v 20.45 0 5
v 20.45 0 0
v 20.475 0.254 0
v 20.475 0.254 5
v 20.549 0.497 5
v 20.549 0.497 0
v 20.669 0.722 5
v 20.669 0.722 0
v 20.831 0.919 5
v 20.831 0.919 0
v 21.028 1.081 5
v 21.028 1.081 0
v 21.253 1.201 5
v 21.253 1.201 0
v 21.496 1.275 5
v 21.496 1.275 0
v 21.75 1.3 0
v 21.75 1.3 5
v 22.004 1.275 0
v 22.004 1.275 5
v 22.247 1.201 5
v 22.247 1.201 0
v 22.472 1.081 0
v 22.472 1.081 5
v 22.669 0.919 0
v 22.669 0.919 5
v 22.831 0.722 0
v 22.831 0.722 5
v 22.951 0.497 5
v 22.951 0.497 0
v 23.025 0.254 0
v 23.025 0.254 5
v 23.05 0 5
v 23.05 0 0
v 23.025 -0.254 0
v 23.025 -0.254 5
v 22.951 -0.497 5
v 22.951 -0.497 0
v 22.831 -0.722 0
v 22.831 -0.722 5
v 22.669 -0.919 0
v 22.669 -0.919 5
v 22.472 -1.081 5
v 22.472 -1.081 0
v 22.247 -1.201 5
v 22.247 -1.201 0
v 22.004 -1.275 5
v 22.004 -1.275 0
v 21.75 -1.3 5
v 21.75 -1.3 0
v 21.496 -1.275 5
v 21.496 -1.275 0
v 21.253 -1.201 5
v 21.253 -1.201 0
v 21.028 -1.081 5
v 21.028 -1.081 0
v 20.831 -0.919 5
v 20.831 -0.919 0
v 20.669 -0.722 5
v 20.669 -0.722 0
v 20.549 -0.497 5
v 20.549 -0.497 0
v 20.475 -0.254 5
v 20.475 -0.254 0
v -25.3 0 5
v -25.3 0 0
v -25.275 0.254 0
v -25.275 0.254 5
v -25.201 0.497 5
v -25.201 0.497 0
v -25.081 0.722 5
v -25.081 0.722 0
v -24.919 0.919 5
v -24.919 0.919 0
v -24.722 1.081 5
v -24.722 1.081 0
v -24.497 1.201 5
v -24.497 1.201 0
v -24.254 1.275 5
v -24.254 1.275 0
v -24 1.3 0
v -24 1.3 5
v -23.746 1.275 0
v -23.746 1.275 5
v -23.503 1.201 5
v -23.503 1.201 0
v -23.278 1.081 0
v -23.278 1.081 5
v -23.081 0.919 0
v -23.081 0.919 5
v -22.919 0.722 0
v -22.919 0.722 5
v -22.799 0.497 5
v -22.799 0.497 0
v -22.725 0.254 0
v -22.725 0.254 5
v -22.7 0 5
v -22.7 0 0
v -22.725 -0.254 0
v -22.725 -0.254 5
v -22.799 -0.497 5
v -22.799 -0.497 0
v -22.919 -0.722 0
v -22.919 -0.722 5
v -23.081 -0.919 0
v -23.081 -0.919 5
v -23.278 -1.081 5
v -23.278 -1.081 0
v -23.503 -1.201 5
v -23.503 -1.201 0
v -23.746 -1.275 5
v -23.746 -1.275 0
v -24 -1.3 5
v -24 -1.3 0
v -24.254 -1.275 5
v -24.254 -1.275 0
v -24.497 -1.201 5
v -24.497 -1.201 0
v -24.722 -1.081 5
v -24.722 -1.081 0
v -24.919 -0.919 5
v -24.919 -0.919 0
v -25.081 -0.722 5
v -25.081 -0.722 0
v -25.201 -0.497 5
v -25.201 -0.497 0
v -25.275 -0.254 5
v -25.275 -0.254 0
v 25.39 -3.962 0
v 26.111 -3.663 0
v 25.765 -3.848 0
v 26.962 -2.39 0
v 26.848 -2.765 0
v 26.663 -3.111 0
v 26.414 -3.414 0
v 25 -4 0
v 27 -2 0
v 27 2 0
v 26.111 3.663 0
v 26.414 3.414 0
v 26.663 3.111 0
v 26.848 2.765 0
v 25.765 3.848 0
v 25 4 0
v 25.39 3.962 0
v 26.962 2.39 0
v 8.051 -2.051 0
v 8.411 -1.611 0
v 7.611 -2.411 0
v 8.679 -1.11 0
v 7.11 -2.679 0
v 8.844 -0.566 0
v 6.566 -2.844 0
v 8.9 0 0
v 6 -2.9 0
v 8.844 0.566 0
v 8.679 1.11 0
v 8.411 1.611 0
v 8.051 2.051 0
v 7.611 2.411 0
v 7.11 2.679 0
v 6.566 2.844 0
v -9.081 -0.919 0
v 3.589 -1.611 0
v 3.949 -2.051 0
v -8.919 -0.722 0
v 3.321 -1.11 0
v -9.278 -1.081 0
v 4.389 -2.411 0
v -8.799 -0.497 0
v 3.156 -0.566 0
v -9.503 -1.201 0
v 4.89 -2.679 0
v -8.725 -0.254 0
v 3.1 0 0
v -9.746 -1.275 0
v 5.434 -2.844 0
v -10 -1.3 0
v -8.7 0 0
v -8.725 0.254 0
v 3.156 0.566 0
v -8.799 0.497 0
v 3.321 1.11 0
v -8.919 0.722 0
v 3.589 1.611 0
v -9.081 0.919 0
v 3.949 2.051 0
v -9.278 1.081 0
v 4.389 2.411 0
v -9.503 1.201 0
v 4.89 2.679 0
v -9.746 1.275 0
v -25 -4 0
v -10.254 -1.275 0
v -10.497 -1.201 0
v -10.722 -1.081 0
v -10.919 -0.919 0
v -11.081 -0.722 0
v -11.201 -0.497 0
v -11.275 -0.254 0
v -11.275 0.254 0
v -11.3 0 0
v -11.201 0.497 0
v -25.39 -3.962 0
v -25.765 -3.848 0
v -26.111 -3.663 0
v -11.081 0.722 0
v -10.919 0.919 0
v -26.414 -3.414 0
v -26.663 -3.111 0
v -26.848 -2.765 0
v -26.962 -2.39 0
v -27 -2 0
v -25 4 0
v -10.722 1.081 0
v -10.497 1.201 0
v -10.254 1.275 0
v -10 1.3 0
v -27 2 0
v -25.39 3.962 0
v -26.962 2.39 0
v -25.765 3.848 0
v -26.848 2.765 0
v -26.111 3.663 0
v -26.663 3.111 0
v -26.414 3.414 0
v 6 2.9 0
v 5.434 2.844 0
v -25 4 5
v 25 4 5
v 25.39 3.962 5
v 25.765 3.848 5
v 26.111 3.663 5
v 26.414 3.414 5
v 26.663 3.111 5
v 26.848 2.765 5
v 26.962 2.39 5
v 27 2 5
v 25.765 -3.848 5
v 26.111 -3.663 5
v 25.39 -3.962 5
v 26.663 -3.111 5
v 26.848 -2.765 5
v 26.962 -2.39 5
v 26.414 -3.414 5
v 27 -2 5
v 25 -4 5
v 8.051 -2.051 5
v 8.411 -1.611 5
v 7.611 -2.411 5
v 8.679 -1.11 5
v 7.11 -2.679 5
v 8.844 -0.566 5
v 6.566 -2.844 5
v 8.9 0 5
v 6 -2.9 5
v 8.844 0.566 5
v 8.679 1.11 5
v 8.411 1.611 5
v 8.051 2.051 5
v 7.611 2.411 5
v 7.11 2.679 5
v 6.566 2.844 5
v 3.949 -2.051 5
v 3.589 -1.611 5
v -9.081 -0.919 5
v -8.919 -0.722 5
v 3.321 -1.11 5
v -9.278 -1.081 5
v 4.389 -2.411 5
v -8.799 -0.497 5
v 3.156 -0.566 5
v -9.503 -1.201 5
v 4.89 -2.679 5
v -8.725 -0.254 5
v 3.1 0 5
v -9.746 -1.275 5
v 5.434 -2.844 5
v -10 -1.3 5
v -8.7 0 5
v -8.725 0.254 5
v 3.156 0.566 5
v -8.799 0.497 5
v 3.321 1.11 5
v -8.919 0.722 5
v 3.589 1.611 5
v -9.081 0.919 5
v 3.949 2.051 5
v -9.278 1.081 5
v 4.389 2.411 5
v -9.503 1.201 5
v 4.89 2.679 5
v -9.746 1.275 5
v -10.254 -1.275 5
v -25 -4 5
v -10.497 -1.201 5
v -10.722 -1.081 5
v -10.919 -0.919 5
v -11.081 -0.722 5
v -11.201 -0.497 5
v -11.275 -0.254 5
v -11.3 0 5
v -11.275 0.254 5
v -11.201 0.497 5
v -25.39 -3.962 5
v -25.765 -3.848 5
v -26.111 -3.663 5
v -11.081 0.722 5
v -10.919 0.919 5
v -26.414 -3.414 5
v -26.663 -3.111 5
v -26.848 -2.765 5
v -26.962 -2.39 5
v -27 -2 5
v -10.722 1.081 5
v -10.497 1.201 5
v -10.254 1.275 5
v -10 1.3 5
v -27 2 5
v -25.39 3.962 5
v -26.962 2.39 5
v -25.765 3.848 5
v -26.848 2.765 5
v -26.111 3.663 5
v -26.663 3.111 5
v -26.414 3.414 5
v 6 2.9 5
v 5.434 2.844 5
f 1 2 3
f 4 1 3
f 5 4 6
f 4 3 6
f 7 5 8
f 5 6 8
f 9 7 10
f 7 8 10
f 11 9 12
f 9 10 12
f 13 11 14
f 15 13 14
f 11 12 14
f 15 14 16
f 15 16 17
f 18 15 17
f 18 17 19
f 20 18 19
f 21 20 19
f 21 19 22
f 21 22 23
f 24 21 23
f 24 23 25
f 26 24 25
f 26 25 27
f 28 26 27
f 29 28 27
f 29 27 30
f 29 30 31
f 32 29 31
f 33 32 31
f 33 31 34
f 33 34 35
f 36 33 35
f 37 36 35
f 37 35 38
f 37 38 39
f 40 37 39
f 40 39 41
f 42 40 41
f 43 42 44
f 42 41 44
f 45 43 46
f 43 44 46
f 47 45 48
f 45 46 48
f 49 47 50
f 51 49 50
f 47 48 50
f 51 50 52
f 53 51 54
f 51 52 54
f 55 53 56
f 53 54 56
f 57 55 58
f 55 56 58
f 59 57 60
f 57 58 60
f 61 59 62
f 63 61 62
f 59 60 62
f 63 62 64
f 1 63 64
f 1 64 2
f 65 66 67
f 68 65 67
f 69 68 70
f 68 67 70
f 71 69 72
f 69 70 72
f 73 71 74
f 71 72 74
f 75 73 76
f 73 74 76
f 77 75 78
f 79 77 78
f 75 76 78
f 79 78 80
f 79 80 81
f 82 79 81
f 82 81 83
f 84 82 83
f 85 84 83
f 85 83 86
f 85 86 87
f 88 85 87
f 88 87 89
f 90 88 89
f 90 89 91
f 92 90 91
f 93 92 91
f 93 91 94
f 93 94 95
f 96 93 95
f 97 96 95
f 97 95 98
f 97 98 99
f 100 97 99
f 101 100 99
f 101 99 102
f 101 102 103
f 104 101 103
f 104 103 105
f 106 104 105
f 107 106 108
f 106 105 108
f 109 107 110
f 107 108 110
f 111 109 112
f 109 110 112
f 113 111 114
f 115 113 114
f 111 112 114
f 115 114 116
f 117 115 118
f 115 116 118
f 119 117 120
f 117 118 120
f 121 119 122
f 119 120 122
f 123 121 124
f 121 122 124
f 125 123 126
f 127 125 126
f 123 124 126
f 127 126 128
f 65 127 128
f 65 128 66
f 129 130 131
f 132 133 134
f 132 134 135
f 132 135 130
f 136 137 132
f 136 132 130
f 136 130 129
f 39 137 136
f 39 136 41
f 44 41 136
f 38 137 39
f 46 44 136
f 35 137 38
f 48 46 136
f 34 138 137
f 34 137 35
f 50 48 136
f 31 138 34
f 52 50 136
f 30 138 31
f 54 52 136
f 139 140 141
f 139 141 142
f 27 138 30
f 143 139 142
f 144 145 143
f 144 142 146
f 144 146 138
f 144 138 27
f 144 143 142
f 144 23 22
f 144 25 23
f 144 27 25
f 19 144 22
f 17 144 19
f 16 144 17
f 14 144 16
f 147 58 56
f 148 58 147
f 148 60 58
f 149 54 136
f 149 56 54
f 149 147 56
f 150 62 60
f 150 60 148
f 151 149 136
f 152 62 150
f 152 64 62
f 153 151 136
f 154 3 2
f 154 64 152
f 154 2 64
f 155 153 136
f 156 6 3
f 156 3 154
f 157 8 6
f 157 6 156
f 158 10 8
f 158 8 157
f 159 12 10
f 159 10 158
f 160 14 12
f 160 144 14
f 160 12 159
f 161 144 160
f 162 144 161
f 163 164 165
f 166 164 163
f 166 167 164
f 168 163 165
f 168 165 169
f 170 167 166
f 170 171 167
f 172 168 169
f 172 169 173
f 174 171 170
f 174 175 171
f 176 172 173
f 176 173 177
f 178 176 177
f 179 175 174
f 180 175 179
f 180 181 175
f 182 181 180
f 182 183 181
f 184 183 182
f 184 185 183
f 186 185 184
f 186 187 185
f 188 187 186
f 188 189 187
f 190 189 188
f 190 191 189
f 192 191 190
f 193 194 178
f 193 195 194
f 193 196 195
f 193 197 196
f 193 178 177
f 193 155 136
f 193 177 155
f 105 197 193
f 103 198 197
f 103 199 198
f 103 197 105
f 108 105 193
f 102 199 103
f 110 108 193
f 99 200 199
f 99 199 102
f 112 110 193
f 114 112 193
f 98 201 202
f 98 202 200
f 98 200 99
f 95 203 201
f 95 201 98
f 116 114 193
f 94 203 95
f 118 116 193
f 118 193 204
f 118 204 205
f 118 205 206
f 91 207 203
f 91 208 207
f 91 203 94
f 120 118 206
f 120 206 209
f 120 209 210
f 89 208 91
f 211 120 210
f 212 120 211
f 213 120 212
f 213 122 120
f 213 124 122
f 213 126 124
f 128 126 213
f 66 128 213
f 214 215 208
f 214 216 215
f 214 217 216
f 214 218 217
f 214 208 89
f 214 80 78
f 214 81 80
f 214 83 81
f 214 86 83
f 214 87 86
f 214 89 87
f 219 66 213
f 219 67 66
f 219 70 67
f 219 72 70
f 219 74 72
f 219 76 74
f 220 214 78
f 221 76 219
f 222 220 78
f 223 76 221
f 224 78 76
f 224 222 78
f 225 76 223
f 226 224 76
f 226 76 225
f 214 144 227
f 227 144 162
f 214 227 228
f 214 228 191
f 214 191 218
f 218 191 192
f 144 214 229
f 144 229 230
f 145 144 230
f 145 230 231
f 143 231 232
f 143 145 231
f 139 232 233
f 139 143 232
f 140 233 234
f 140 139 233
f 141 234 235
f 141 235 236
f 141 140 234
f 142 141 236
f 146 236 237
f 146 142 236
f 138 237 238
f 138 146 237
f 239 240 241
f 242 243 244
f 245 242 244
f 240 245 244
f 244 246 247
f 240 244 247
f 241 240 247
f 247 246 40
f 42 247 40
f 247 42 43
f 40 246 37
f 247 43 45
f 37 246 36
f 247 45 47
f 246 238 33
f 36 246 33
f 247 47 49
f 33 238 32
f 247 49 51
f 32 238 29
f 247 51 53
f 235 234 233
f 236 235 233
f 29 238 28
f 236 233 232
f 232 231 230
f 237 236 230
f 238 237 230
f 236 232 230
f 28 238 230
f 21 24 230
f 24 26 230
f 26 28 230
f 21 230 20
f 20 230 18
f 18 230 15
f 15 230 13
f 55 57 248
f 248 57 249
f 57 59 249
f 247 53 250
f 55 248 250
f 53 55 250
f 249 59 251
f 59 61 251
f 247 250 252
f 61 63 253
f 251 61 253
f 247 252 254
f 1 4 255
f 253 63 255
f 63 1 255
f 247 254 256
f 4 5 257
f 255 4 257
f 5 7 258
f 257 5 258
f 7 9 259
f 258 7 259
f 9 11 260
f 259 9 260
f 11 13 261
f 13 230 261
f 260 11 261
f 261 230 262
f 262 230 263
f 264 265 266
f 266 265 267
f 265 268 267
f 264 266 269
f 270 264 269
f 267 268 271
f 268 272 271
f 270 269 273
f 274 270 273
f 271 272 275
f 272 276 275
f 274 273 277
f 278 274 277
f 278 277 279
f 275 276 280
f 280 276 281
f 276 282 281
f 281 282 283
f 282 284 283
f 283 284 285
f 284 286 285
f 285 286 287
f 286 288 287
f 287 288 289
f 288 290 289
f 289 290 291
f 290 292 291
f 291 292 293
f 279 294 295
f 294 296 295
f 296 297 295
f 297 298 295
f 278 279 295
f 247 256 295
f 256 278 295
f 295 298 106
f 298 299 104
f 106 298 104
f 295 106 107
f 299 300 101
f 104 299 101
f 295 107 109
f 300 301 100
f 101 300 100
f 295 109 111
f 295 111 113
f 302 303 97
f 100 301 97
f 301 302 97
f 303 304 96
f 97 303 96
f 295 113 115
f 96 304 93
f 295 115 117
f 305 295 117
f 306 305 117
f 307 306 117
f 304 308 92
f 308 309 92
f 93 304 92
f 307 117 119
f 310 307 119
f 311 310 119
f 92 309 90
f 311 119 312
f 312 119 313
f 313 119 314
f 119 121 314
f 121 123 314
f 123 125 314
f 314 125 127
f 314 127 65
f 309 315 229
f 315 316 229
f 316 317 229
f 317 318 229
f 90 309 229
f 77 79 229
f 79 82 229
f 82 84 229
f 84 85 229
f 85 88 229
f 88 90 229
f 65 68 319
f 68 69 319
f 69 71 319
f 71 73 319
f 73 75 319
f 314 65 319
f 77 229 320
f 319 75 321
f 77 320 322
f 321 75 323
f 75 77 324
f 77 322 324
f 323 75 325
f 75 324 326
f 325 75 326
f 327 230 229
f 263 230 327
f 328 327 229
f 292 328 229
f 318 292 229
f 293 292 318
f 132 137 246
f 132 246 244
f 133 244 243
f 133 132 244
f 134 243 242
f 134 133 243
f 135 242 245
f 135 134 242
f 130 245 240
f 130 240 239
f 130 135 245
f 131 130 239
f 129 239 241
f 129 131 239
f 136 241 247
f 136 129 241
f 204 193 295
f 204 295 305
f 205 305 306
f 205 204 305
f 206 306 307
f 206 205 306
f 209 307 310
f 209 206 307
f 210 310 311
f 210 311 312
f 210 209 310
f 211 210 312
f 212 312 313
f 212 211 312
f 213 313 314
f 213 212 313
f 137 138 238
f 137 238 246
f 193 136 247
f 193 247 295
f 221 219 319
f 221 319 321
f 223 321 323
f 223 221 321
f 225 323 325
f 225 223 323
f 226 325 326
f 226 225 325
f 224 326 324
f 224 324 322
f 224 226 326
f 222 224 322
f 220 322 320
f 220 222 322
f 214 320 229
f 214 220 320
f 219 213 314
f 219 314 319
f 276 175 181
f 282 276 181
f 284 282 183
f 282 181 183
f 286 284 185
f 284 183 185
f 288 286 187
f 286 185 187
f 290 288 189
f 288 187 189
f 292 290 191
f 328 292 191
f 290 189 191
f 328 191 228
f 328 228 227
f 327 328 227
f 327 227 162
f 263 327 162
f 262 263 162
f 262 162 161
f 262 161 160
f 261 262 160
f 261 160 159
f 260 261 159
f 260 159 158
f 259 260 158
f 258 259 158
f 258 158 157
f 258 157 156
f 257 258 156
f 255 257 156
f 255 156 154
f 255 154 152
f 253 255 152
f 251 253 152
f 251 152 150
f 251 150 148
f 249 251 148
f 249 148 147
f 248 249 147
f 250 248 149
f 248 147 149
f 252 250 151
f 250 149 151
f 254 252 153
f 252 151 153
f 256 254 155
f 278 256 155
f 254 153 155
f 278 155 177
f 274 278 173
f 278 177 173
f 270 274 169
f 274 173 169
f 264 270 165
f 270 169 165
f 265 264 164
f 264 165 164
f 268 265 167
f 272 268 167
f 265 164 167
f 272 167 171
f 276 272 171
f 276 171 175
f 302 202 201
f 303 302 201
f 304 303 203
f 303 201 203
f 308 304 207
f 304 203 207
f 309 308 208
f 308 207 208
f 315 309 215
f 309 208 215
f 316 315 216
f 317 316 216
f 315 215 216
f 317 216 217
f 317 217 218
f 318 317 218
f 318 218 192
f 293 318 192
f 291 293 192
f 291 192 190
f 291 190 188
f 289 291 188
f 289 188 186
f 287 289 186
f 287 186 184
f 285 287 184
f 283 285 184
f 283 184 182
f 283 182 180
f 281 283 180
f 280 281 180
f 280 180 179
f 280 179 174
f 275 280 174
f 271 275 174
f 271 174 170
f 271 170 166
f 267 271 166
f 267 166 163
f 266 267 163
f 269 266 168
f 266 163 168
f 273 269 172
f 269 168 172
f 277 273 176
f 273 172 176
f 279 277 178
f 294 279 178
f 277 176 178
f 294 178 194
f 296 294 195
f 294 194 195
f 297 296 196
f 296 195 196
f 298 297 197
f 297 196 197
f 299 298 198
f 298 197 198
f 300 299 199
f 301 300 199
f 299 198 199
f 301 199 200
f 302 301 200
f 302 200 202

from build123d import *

# Parameters (mm, degrees)
DODANIE_WYCI_GNI_CIE1_DEPTH = 5
OTW_R_POD_RUB_M21_D         = 2.6
OTW_R_POD_RUB_M21_DEPTH     = 5
OTW_R_POD_RUB_M51_D         = 5.8
OTW_R_POD_RUB_M51_DEPTH     = 5
OTW_R_POD_RUB_M22_D         = 2.6
OTW_R_POD_RUB_M22_DEPTH     = 5


with BuildPart() as part:
    # Szkic1 → Dodanie-wyciągnięcie1 (new body)
    with BuildSketch(Plane.XY):
        with BuildLine():
            Line((-25, 4), (25, 4))
            ThreePointArc((25, 4), (26.414213562, 3.414213562), (27, 2))
            Line((27, 2), (27, -2))
            ThreePointArc((27, -2), (26.414213562, -3.414213562), (25, -4))
            Line((25, -4), (-25, -4))
            ThreePointArc((-25, -4), (-26.414213562, -3.414213562), (-27, -2))
            Line((-27, -2), (-27, 2))
            ThreePointArc((-27, 2), (-26.414213562, 3.414213562), (-25, 4))
        make_face()
    extrude(amount=DODANIE_WYCI_GNI_CIE1_DEPTH)

    # Otwór pod śrubę M21
    with Locations(Plane.XY.offset(5)):
        with Locations((-10, 0), (21.75, 0)):
            Hole(OTW_R_POD_RUB_M21_D / 2, depth=OTW_R_POD_RUB_M21_DEPTH)

    # Otwór pod śrubę M51
    with Locations(Plane.XY.offset(5)):
        with Locations((6, 0)):
            Hole(OTW_R_POD_RUB_M51_D / 2, depth=OTW_R_POD_RUB_M51_DEPTH)

    # Otwór pod śrubę M22
    with Locations(Plane.XY.offset(5)):
        with Locations((-24, 0)):
            Hole(OTW_R_POD_RUB_M22_D / 2, depth=OTW_R_POD_RUB_M22_DEPTH)


solid = part.part
